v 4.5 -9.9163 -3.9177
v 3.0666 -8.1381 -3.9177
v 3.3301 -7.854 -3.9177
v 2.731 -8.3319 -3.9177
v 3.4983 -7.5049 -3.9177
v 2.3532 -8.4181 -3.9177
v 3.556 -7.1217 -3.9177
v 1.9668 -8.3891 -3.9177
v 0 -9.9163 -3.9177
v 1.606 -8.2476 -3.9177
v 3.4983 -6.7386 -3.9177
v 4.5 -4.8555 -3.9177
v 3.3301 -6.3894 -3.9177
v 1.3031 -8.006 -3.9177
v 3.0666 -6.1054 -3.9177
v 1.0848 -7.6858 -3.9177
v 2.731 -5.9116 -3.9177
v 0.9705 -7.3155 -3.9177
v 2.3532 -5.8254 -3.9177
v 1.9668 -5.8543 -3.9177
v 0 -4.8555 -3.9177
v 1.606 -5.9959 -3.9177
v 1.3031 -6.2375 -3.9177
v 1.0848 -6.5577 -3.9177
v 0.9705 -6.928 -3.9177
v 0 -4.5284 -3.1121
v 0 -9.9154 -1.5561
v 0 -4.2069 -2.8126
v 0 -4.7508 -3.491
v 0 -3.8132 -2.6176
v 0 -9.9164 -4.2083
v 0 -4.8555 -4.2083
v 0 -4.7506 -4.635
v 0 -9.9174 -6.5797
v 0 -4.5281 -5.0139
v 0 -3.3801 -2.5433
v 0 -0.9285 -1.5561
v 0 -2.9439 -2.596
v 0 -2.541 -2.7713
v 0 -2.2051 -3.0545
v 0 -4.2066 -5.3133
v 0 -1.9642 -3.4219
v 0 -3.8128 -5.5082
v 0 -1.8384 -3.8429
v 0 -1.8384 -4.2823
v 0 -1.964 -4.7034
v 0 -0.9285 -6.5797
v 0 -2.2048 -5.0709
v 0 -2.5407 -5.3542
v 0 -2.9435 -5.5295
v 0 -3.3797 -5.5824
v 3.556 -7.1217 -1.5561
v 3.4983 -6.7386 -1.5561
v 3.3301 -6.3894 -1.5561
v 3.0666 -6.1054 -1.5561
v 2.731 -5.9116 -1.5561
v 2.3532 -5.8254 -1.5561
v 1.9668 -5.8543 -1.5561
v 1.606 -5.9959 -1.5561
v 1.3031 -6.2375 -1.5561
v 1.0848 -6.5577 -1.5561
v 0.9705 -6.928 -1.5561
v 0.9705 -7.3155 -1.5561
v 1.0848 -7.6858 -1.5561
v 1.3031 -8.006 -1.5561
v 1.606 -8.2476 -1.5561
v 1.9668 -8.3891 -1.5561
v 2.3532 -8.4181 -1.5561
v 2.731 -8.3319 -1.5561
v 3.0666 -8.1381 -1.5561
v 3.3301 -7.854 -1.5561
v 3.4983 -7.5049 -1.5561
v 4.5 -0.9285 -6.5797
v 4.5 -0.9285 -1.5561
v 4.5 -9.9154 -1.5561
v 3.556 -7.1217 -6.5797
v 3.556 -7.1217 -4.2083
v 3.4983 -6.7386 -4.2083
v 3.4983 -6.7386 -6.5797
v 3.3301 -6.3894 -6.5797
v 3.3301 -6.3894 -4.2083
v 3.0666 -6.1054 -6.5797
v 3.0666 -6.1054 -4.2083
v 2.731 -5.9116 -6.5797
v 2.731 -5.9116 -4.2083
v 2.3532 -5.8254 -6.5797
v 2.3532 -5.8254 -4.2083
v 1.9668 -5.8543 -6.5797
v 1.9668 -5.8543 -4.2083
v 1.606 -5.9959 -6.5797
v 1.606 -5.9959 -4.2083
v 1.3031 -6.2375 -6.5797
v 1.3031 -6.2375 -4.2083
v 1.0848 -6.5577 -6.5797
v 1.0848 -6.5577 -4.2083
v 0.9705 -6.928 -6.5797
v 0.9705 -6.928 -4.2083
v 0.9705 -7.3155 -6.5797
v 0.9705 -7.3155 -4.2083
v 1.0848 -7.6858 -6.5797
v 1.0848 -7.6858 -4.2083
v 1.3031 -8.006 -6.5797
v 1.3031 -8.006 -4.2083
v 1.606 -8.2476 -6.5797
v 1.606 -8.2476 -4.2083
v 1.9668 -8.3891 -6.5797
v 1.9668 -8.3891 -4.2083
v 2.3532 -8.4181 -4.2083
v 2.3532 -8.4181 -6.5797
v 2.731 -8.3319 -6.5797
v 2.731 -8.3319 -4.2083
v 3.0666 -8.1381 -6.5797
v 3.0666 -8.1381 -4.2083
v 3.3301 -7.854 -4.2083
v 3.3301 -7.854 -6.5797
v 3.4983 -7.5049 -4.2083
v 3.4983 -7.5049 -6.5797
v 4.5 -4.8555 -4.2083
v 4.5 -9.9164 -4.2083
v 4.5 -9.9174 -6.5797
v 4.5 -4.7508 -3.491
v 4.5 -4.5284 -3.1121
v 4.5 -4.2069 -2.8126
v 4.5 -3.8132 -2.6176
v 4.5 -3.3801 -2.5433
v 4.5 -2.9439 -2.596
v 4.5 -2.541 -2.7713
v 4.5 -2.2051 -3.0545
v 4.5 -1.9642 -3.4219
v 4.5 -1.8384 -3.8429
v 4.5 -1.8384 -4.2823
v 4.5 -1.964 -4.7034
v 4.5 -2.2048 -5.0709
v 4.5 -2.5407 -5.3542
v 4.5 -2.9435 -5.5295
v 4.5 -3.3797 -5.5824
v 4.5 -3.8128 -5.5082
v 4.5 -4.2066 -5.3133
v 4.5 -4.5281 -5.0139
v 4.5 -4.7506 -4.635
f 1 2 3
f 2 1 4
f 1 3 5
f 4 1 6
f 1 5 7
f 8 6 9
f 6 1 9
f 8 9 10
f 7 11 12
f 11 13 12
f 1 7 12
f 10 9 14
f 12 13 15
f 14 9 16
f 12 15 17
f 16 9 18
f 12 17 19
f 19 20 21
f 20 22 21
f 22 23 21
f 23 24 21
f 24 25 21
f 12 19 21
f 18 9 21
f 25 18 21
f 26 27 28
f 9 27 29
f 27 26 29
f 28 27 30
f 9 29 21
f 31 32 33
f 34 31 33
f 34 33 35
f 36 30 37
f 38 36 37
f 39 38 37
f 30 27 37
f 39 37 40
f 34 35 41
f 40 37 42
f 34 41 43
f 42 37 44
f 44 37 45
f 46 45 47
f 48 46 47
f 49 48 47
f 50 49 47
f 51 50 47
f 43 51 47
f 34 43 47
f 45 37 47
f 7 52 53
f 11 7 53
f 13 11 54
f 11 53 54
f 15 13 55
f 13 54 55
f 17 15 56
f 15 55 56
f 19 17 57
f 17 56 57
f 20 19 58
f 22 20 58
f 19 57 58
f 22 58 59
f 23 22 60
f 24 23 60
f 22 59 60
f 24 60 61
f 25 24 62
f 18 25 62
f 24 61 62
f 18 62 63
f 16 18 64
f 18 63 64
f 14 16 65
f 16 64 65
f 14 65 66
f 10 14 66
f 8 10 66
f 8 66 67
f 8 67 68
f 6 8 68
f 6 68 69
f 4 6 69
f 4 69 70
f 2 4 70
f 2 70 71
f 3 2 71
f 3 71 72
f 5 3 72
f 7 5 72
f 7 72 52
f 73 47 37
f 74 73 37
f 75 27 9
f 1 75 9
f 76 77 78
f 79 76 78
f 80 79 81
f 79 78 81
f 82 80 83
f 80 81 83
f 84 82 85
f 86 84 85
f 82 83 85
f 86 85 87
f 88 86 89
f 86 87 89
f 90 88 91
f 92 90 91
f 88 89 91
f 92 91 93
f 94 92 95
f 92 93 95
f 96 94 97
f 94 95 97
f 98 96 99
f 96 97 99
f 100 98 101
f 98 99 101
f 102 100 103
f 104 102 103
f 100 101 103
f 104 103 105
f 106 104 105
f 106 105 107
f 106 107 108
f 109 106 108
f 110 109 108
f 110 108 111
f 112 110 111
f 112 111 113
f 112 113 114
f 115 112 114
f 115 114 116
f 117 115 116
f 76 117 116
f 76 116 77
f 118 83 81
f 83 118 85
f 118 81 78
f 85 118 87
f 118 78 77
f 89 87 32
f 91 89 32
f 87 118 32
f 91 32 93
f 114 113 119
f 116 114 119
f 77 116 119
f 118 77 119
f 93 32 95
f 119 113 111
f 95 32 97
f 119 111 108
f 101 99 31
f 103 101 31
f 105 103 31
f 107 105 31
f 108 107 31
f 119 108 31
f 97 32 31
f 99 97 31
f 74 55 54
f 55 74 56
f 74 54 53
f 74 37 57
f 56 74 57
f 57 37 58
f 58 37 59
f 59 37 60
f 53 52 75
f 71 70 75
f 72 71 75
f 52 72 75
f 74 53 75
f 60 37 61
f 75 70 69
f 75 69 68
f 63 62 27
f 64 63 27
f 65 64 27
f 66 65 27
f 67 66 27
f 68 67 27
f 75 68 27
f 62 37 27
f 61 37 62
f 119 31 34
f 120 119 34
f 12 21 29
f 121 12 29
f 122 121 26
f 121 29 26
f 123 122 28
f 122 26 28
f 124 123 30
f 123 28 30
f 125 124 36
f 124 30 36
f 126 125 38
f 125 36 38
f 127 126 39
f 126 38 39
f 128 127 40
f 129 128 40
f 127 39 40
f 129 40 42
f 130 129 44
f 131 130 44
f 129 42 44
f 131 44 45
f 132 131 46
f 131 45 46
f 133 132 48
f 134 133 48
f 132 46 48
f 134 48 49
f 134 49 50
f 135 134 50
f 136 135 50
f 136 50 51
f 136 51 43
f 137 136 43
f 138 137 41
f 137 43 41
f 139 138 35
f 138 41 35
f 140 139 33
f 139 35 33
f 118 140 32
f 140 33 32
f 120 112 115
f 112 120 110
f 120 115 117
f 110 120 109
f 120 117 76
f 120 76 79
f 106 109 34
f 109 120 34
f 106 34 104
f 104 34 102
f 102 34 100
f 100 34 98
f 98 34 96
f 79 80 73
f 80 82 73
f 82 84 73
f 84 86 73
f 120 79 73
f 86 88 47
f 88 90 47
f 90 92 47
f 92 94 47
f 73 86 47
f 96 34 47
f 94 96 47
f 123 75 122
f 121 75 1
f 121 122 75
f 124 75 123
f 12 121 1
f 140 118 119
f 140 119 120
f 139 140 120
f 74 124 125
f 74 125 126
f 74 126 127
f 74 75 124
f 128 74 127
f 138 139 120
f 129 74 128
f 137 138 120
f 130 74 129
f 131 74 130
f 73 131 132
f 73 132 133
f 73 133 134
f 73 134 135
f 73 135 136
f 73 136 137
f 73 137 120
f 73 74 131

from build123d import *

# Parameters (mm, degrees)
BOSS_EXTRUDE2_DEPTH = 4.5
SKETCH3_R           = 1.3
CUT_EXTRUDE1_DEPTH  = 10.5


with BuildPart() as part:
    # Sketch1 → Boss-Extrude2 (new body)
    with BuildSketch(Plane(origin=(0, 0, 0), x_dir=(0, 0, -1), z_dir=(1, 0, 0))):
        with BuildLine():
            Line((1.55613054, -9.91539795), (3.917713804, -9.916320319))
            Line((3.917713804, -9.916320319), (3.917713804, -4.855498596))
            ThreePointArc((3.917713804, -4.855498596), (4.062635704, -1.822441499), (4.208325788, -4.855461794))
            Line((4.208325788, -4.855461794), (4.208325788, -9.916433824))
            Line((4.208325788, -9.916433824), (6.579674081, -9.917360006))
            Line((6.579674081, -9.917360006), (6.579674081, -0.928463249))
            Line((6.579674081, -0.928463249), (1.55613054, -0.928463249))
            Line((1.55613054, -0.928463249), (1.55613054, -9.91539795))
        make_face()
    extrude(amount=BOSS_EXTRUDE2_DEPTH)

    # Sketch3 → Cut-Extrude1 (cut)
    with BuildSketch(Plane.XY.offset(-1.55613054)):
        with Locations((2.256029543, -7.121731935)):
            Circle(SKETCH3_R)
    extrude(amount=-CUT_EXTRUDE1_DEPTH, mode=Mode.SUBTRACT)


solid = part.part
